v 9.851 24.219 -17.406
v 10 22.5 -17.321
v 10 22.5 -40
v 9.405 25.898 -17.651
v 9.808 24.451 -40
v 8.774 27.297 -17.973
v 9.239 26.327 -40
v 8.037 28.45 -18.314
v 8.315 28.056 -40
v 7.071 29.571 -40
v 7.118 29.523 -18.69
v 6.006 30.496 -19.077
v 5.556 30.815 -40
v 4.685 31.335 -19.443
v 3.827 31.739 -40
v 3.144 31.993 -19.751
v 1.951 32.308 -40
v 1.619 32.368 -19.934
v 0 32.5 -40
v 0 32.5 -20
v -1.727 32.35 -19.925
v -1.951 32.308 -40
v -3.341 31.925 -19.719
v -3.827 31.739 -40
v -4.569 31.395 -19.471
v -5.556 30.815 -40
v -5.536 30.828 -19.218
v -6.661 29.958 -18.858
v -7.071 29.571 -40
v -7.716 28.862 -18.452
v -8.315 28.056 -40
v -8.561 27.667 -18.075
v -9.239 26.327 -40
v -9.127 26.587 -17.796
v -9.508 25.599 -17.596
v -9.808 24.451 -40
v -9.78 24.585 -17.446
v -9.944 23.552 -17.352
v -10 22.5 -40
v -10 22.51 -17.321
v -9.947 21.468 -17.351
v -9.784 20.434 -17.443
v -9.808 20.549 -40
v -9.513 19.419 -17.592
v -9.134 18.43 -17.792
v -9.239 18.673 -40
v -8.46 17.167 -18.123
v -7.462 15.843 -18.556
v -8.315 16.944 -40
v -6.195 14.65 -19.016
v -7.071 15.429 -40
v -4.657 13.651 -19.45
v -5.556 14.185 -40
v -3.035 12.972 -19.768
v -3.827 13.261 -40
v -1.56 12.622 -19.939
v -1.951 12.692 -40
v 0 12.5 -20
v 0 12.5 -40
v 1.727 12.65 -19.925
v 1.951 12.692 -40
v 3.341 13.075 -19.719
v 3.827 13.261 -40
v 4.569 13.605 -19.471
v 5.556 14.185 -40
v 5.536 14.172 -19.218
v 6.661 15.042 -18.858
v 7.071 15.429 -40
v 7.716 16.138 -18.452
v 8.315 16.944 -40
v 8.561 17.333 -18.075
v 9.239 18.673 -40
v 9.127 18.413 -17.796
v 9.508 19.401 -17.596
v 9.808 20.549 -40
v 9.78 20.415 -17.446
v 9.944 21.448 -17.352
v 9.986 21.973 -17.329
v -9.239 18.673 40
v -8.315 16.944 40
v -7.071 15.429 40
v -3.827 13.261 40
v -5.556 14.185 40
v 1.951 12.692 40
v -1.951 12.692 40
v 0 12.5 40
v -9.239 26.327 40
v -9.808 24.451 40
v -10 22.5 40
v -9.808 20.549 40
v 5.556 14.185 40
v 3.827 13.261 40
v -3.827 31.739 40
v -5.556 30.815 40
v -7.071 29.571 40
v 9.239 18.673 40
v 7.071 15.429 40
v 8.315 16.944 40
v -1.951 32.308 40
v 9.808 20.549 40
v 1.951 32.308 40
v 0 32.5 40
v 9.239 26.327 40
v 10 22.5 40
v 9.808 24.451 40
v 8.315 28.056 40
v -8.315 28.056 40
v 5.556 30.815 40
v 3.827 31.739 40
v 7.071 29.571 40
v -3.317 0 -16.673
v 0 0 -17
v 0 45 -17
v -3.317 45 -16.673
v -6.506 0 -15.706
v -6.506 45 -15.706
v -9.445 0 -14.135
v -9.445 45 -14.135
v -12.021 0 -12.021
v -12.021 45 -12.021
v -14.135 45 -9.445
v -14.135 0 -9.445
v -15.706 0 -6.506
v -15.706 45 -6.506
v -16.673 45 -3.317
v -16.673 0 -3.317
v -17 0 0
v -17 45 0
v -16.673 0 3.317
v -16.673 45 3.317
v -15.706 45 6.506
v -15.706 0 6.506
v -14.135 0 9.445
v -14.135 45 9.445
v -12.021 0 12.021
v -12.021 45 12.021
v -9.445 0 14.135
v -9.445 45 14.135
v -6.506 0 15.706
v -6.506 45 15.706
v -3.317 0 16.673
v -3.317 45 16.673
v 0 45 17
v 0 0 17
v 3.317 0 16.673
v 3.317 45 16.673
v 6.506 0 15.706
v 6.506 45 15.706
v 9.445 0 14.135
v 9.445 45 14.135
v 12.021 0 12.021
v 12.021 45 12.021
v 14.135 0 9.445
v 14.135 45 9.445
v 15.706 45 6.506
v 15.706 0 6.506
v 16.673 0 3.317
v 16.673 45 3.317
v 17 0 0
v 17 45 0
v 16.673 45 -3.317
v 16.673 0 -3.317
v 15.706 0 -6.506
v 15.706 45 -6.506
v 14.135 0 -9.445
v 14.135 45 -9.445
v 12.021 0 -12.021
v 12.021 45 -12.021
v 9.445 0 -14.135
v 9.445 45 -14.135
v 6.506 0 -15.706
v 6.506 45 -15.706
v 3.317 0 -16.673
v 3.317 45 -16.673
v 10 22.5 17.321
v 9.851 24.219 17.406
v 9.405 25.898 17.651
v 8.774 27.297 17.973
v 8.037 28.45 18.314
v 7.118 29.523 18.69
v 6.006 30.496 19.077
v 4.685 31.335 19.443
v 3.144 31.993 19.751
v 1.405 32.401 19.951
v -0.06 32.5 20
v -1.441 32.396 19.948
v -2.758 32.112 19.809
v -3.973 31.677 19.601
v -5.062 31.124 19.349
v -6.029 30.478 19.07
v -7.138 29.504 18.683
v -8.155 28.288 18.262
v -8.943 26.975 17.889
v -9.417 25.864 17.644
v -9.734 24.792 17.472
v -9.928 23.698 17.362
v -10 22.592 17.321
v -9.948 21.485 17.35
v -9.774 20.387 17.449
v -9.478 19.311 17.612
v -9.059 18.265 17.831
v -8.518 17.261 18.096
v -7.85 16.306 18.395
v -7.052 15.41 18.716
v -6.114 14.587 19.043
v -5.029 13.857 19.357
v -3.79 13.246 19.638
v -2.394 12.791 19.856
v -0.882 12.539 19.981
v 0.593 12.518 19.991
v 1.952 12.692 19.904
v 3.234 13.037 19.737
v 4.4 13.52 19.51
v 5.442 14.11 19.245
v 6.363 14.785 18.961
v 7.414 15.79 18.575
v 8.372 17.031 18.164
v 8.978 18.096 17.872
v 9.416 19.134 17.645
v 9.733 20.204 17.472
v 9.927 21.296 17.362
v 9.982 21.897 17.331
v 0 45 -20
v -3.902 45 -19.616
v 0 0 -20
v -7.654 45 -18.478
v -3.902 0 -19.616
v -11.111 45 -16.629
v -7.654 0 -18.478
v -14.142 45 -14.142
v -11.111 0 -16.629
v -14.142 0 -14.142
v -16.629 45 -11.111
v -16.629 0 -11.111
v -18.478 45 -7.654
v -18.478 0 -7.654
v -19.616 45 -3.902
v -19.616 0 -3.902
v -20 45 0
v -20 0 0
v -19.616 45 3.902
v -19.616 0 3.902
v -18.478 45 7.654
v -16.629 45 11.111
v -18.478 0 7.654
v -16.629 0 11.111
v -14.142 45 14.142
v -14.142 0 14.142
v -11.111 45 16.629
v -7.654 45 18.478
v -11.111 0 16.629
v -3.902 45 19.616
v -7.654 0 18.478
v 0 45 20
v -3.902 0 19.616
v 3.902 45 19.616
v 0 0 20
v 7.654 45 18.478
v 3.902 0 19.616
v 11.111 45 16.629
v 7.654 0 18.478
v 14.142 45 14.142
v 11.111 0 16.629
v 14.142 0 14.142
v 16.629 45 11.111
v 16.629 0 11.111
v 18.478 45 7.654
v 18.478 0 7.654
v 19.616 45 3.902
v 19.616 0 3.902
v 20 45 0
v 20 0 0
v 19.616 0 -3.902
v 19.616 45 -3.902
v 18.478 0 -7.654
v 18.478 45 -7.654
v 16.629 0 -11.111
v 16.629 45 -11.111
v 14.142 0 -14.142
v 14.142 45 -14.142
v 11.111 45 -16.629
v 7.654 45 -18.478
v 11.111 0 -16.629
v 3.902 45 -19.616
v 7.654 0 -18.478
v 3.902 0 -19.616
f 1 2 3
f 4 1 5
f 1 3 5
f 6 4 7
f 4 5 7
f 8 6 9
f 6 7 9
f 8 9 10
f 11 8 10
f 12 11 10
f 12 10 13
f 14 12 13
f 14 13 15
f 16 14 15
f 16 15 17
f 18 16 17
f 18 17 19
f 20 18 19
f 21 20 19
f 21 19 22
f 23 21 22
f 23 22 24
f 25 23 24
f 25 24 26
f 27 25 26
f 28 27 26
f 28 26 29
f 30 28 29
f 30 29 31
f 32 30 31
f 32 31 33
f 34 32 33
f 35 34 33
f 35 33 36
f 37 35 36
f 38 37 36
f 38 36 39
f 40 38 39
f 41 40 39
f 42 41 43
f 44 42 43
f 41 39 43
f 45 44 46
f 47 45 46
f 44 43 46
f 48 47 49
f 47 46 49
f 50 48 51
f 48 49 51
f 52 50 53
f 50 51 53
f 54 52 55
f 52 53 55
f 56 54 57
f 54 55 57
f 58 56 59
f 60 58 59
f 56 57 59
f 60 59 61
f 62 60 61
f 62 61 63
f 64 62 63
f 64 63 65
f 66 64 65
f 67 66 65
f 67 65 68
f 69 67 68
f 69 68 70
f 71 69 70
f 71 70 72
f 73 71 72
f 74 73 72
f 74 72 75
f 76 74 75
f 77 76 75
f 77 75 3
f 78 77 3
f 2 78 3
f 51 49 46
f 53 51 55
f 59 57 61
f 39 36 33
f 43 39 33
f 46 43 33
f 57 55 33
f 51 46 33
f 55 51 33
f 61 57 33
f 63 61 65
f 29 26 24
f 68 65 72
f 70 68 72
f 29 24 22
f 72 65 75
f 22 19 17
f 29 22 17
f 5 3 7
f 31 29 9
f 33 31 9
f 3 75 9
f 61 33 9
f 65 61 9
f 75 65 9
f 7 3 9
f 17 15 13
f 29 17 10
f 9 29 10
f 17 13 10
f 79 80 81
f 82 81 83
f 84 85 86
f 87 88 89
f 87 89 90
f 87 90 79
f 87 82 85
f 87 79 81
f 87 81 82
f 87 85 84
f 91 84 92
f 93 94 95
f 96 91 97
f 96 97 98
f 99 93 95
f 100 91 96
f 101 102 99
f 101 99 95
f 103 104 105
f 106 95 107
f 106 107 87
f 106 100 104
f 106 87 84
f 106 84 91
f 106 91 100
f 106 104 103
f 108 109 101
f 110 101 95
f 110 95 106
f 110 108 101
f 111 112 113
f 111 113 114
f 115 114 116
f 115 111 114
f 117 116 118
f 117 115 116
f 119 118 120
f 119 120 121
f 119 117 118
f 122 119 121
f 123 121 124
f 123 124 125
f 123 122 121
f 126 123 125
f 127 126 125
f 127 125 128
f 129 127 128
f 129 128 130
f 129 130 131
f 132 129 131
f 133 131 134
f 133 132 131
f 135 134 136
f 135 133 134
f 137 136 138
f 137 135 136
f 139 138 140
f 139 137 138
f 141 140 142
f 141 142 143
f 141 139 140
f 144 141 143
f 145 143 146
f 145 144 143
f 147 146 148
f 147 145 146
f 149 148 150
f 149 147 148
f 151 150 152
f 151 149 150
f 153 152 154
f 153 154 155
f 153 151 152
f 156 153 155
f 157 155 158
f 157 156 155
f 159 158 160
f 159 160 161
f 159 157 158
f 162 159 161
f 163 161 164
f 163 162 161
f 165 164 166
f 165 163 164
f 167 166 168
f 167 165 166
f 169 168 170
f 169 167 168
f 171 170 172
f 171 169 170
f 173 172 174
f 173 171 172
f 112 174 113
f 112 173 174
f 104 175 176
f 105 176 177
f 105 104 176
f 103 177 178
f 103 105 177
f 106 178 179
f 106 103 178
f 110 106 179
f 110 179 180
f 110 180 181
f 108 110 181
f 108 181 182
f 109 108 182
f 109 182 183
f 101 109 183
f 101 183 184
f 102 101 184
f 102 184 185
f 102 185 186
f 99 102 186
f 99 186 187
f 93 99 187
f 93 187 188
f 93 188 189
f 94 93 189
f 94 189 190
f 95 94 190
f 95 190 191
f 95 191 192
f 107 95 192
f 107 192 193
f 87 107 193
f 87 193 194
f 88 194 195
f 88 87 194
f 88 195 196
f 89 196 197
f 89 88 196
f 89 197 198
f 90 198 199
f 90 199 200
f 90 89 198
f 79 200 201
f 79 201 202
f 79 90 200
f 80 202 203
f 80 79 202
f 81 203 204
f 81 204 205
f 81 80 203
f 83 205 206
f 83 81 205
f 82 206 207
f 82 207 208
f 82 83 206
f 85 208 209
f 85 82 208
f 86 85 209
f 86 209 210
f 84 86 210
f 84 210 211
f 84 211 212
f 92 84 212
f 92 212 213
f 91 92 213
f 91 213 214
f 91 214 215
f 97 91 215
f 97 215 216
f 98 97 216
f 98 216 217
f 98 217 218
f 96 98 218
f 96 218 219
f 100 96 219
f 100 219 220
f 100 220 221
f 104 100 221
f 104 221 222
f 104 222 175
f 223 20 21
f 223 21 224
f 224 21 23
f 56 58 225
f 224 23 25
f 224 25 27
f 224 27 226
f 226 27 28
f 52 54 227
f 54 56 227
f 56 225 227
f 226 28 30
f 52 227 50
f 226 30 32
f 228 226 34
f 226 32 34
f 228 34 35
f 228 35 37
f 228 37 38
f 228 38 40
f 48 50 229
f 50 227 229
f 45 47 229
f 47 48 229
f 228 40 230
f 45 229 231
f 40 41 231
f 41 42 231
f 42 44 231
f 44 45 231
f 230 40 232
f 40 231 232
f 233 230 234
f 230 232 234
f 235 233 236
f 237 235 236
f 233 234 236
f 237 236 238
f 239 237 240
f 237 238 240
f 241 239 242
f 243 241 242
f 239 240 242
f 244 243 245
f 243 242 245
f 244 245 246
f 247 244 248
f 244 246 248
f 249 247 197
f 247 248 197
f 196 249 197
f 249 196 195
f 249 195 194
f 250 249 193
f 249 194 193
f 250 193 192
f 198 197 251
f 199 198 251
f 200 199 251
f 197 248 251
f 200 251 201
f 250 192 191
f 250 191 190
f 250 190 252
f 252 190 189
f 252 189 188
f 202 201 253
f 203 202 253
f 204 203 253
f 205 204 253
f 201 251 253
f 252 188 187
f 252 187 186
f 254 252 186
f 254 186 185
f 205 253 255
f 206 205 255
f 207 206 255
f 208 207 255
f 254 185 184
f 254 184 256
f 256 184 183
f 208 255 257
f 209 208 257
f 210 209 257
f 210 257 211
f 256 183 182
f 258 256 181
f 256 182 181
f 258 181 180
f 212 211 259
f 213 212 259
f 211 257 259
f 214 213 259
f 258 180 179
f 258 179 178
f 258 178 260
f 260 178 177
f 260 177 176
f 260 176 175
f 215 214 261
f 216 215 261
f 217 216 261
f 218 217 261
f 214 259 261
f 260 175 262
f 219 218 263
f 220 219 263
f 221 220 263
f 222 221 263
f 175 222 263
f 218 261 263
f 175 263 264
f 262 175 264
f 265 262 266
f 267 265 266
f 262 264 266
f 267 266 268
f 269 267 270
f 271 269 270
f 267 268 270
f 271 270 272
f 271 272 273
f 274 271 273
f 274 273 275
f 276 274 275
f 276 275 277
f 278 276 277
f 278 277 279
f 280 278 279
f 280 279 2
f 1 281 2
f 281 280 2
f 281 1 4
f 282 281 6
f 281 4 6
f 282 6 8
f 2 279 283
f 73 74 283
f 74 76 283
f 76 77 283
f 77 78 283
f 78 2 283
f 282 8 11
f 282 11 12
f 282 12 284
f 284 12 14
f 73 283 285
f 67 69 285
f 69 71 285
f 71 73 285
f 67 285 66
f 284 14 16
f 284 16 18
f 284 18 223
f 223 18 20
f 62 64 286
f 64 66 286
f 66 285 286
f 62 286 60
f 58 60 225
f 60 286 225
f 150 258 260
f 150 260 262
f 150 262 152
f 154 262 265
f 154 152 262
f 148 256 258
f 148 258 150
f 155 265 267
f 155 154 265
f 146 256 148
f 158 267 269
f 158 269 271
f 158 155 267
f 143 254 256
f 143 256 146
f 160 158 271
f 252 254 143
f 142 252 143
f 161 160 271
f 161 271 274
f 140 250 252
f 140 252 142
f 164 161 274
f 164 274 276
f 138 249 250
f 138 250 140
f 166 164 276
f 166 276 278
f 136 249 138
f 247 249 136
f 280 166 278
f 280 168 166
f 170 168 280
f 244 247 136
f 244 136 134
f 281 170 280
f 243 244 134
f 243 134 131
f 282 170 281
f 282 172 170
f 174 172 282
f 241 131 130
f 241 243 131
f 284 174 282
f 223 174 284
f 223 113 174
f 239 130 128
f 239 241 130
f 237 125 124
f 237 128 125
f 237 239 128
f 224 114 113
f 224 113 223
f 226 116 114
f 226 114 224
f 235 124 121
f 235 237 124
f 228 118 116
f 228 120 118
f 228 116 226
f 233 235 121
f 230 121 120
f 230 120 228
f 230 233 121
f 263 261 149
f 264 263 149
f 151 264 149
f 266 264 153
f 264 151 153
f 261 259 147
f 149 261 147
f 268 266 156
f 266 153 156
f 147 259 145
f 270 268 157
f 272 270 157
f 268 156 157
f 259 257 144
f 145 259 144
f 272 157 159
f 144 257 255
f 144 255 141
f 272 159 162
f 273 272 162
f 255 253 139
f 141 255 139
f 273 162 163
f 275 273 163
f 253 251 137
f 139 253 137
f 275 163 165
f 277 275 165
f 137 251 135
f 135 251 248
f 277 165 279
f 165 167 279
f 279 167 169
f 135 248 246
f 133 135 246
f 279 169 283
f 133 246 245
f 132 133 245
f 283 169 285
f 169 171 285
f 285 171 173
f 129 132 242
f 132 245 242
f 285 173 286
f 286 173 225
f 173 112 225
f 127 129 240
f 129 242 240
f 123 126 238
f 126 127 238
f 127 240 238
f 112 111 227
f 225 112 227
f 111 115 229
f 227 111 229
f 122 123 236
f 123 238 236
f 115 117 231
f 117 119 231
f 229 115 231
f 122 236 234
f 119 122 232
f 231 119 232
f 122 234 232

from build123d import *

# Parameters (mm, degrees)
SKETCH_2_R           = 20
SKETCH_2_R_2         = 17
EXTRUDE_1_DEPTH      = 45
EXTRUDE_2_REACH      = 79.621
EXTRUDE_2_END_RADIUS = 20
SKETCH_3_R           = 10


with BuildPart() as part:
    # 草图2 → 凸台-拉伸1 (new body)
    with BuildSketch(Plane(origin=(0, 0, 0), x_dir=(1, 0, 0), z_dir=(0, 1, 0))):
        with Locations(Location((0, 0, 0), (0, 0, 90))):
            Circle(SKETCH_2_R)
        with Locations(Location((0, 0, 0), (0, 0, 90))):
            Circle(SKETCH_2_R_2, mode=Mode.SUBTRACT)
    extrude(amount=EXTRUDE_1_DEPTH)

    # 凸台-拉伸2: up to this cylinder (the profile starts outside it)
    extrude_2_end = Plane(origin=(0, 22.5, 0), z_dir=(0, -1, 0)) * Cylinder(EXTRUDE_2_END_RADIUS, 200.242, mode=Mode.PRIVATE)
    # 草图3 → 凸台-拉伸2 (add, up to the surface)
    with BuildSketch(Plane.XY.offset(40), mode=Mode.PRIVATE) as extrude_2_sk1:
        with Locations((0, 22.5)):
            Circle(SKETCH_3_R)
    extrude_2_tool1 = extrude(extrude_2_sk1.sketch, amount=-EXTRUDE_2_REACH, mode=Mode.PRIVATE) - extrude_2_end
    extrude_2 = extrude_2_tool1.solids().sort_by_distance((0, 22.5, 40))[0]
    add(extrude_2)

    # 镜向2: 凸台-拉伸2 across plane
    add(extrude_2.mirror(Plane.XY))


solid = part.part
